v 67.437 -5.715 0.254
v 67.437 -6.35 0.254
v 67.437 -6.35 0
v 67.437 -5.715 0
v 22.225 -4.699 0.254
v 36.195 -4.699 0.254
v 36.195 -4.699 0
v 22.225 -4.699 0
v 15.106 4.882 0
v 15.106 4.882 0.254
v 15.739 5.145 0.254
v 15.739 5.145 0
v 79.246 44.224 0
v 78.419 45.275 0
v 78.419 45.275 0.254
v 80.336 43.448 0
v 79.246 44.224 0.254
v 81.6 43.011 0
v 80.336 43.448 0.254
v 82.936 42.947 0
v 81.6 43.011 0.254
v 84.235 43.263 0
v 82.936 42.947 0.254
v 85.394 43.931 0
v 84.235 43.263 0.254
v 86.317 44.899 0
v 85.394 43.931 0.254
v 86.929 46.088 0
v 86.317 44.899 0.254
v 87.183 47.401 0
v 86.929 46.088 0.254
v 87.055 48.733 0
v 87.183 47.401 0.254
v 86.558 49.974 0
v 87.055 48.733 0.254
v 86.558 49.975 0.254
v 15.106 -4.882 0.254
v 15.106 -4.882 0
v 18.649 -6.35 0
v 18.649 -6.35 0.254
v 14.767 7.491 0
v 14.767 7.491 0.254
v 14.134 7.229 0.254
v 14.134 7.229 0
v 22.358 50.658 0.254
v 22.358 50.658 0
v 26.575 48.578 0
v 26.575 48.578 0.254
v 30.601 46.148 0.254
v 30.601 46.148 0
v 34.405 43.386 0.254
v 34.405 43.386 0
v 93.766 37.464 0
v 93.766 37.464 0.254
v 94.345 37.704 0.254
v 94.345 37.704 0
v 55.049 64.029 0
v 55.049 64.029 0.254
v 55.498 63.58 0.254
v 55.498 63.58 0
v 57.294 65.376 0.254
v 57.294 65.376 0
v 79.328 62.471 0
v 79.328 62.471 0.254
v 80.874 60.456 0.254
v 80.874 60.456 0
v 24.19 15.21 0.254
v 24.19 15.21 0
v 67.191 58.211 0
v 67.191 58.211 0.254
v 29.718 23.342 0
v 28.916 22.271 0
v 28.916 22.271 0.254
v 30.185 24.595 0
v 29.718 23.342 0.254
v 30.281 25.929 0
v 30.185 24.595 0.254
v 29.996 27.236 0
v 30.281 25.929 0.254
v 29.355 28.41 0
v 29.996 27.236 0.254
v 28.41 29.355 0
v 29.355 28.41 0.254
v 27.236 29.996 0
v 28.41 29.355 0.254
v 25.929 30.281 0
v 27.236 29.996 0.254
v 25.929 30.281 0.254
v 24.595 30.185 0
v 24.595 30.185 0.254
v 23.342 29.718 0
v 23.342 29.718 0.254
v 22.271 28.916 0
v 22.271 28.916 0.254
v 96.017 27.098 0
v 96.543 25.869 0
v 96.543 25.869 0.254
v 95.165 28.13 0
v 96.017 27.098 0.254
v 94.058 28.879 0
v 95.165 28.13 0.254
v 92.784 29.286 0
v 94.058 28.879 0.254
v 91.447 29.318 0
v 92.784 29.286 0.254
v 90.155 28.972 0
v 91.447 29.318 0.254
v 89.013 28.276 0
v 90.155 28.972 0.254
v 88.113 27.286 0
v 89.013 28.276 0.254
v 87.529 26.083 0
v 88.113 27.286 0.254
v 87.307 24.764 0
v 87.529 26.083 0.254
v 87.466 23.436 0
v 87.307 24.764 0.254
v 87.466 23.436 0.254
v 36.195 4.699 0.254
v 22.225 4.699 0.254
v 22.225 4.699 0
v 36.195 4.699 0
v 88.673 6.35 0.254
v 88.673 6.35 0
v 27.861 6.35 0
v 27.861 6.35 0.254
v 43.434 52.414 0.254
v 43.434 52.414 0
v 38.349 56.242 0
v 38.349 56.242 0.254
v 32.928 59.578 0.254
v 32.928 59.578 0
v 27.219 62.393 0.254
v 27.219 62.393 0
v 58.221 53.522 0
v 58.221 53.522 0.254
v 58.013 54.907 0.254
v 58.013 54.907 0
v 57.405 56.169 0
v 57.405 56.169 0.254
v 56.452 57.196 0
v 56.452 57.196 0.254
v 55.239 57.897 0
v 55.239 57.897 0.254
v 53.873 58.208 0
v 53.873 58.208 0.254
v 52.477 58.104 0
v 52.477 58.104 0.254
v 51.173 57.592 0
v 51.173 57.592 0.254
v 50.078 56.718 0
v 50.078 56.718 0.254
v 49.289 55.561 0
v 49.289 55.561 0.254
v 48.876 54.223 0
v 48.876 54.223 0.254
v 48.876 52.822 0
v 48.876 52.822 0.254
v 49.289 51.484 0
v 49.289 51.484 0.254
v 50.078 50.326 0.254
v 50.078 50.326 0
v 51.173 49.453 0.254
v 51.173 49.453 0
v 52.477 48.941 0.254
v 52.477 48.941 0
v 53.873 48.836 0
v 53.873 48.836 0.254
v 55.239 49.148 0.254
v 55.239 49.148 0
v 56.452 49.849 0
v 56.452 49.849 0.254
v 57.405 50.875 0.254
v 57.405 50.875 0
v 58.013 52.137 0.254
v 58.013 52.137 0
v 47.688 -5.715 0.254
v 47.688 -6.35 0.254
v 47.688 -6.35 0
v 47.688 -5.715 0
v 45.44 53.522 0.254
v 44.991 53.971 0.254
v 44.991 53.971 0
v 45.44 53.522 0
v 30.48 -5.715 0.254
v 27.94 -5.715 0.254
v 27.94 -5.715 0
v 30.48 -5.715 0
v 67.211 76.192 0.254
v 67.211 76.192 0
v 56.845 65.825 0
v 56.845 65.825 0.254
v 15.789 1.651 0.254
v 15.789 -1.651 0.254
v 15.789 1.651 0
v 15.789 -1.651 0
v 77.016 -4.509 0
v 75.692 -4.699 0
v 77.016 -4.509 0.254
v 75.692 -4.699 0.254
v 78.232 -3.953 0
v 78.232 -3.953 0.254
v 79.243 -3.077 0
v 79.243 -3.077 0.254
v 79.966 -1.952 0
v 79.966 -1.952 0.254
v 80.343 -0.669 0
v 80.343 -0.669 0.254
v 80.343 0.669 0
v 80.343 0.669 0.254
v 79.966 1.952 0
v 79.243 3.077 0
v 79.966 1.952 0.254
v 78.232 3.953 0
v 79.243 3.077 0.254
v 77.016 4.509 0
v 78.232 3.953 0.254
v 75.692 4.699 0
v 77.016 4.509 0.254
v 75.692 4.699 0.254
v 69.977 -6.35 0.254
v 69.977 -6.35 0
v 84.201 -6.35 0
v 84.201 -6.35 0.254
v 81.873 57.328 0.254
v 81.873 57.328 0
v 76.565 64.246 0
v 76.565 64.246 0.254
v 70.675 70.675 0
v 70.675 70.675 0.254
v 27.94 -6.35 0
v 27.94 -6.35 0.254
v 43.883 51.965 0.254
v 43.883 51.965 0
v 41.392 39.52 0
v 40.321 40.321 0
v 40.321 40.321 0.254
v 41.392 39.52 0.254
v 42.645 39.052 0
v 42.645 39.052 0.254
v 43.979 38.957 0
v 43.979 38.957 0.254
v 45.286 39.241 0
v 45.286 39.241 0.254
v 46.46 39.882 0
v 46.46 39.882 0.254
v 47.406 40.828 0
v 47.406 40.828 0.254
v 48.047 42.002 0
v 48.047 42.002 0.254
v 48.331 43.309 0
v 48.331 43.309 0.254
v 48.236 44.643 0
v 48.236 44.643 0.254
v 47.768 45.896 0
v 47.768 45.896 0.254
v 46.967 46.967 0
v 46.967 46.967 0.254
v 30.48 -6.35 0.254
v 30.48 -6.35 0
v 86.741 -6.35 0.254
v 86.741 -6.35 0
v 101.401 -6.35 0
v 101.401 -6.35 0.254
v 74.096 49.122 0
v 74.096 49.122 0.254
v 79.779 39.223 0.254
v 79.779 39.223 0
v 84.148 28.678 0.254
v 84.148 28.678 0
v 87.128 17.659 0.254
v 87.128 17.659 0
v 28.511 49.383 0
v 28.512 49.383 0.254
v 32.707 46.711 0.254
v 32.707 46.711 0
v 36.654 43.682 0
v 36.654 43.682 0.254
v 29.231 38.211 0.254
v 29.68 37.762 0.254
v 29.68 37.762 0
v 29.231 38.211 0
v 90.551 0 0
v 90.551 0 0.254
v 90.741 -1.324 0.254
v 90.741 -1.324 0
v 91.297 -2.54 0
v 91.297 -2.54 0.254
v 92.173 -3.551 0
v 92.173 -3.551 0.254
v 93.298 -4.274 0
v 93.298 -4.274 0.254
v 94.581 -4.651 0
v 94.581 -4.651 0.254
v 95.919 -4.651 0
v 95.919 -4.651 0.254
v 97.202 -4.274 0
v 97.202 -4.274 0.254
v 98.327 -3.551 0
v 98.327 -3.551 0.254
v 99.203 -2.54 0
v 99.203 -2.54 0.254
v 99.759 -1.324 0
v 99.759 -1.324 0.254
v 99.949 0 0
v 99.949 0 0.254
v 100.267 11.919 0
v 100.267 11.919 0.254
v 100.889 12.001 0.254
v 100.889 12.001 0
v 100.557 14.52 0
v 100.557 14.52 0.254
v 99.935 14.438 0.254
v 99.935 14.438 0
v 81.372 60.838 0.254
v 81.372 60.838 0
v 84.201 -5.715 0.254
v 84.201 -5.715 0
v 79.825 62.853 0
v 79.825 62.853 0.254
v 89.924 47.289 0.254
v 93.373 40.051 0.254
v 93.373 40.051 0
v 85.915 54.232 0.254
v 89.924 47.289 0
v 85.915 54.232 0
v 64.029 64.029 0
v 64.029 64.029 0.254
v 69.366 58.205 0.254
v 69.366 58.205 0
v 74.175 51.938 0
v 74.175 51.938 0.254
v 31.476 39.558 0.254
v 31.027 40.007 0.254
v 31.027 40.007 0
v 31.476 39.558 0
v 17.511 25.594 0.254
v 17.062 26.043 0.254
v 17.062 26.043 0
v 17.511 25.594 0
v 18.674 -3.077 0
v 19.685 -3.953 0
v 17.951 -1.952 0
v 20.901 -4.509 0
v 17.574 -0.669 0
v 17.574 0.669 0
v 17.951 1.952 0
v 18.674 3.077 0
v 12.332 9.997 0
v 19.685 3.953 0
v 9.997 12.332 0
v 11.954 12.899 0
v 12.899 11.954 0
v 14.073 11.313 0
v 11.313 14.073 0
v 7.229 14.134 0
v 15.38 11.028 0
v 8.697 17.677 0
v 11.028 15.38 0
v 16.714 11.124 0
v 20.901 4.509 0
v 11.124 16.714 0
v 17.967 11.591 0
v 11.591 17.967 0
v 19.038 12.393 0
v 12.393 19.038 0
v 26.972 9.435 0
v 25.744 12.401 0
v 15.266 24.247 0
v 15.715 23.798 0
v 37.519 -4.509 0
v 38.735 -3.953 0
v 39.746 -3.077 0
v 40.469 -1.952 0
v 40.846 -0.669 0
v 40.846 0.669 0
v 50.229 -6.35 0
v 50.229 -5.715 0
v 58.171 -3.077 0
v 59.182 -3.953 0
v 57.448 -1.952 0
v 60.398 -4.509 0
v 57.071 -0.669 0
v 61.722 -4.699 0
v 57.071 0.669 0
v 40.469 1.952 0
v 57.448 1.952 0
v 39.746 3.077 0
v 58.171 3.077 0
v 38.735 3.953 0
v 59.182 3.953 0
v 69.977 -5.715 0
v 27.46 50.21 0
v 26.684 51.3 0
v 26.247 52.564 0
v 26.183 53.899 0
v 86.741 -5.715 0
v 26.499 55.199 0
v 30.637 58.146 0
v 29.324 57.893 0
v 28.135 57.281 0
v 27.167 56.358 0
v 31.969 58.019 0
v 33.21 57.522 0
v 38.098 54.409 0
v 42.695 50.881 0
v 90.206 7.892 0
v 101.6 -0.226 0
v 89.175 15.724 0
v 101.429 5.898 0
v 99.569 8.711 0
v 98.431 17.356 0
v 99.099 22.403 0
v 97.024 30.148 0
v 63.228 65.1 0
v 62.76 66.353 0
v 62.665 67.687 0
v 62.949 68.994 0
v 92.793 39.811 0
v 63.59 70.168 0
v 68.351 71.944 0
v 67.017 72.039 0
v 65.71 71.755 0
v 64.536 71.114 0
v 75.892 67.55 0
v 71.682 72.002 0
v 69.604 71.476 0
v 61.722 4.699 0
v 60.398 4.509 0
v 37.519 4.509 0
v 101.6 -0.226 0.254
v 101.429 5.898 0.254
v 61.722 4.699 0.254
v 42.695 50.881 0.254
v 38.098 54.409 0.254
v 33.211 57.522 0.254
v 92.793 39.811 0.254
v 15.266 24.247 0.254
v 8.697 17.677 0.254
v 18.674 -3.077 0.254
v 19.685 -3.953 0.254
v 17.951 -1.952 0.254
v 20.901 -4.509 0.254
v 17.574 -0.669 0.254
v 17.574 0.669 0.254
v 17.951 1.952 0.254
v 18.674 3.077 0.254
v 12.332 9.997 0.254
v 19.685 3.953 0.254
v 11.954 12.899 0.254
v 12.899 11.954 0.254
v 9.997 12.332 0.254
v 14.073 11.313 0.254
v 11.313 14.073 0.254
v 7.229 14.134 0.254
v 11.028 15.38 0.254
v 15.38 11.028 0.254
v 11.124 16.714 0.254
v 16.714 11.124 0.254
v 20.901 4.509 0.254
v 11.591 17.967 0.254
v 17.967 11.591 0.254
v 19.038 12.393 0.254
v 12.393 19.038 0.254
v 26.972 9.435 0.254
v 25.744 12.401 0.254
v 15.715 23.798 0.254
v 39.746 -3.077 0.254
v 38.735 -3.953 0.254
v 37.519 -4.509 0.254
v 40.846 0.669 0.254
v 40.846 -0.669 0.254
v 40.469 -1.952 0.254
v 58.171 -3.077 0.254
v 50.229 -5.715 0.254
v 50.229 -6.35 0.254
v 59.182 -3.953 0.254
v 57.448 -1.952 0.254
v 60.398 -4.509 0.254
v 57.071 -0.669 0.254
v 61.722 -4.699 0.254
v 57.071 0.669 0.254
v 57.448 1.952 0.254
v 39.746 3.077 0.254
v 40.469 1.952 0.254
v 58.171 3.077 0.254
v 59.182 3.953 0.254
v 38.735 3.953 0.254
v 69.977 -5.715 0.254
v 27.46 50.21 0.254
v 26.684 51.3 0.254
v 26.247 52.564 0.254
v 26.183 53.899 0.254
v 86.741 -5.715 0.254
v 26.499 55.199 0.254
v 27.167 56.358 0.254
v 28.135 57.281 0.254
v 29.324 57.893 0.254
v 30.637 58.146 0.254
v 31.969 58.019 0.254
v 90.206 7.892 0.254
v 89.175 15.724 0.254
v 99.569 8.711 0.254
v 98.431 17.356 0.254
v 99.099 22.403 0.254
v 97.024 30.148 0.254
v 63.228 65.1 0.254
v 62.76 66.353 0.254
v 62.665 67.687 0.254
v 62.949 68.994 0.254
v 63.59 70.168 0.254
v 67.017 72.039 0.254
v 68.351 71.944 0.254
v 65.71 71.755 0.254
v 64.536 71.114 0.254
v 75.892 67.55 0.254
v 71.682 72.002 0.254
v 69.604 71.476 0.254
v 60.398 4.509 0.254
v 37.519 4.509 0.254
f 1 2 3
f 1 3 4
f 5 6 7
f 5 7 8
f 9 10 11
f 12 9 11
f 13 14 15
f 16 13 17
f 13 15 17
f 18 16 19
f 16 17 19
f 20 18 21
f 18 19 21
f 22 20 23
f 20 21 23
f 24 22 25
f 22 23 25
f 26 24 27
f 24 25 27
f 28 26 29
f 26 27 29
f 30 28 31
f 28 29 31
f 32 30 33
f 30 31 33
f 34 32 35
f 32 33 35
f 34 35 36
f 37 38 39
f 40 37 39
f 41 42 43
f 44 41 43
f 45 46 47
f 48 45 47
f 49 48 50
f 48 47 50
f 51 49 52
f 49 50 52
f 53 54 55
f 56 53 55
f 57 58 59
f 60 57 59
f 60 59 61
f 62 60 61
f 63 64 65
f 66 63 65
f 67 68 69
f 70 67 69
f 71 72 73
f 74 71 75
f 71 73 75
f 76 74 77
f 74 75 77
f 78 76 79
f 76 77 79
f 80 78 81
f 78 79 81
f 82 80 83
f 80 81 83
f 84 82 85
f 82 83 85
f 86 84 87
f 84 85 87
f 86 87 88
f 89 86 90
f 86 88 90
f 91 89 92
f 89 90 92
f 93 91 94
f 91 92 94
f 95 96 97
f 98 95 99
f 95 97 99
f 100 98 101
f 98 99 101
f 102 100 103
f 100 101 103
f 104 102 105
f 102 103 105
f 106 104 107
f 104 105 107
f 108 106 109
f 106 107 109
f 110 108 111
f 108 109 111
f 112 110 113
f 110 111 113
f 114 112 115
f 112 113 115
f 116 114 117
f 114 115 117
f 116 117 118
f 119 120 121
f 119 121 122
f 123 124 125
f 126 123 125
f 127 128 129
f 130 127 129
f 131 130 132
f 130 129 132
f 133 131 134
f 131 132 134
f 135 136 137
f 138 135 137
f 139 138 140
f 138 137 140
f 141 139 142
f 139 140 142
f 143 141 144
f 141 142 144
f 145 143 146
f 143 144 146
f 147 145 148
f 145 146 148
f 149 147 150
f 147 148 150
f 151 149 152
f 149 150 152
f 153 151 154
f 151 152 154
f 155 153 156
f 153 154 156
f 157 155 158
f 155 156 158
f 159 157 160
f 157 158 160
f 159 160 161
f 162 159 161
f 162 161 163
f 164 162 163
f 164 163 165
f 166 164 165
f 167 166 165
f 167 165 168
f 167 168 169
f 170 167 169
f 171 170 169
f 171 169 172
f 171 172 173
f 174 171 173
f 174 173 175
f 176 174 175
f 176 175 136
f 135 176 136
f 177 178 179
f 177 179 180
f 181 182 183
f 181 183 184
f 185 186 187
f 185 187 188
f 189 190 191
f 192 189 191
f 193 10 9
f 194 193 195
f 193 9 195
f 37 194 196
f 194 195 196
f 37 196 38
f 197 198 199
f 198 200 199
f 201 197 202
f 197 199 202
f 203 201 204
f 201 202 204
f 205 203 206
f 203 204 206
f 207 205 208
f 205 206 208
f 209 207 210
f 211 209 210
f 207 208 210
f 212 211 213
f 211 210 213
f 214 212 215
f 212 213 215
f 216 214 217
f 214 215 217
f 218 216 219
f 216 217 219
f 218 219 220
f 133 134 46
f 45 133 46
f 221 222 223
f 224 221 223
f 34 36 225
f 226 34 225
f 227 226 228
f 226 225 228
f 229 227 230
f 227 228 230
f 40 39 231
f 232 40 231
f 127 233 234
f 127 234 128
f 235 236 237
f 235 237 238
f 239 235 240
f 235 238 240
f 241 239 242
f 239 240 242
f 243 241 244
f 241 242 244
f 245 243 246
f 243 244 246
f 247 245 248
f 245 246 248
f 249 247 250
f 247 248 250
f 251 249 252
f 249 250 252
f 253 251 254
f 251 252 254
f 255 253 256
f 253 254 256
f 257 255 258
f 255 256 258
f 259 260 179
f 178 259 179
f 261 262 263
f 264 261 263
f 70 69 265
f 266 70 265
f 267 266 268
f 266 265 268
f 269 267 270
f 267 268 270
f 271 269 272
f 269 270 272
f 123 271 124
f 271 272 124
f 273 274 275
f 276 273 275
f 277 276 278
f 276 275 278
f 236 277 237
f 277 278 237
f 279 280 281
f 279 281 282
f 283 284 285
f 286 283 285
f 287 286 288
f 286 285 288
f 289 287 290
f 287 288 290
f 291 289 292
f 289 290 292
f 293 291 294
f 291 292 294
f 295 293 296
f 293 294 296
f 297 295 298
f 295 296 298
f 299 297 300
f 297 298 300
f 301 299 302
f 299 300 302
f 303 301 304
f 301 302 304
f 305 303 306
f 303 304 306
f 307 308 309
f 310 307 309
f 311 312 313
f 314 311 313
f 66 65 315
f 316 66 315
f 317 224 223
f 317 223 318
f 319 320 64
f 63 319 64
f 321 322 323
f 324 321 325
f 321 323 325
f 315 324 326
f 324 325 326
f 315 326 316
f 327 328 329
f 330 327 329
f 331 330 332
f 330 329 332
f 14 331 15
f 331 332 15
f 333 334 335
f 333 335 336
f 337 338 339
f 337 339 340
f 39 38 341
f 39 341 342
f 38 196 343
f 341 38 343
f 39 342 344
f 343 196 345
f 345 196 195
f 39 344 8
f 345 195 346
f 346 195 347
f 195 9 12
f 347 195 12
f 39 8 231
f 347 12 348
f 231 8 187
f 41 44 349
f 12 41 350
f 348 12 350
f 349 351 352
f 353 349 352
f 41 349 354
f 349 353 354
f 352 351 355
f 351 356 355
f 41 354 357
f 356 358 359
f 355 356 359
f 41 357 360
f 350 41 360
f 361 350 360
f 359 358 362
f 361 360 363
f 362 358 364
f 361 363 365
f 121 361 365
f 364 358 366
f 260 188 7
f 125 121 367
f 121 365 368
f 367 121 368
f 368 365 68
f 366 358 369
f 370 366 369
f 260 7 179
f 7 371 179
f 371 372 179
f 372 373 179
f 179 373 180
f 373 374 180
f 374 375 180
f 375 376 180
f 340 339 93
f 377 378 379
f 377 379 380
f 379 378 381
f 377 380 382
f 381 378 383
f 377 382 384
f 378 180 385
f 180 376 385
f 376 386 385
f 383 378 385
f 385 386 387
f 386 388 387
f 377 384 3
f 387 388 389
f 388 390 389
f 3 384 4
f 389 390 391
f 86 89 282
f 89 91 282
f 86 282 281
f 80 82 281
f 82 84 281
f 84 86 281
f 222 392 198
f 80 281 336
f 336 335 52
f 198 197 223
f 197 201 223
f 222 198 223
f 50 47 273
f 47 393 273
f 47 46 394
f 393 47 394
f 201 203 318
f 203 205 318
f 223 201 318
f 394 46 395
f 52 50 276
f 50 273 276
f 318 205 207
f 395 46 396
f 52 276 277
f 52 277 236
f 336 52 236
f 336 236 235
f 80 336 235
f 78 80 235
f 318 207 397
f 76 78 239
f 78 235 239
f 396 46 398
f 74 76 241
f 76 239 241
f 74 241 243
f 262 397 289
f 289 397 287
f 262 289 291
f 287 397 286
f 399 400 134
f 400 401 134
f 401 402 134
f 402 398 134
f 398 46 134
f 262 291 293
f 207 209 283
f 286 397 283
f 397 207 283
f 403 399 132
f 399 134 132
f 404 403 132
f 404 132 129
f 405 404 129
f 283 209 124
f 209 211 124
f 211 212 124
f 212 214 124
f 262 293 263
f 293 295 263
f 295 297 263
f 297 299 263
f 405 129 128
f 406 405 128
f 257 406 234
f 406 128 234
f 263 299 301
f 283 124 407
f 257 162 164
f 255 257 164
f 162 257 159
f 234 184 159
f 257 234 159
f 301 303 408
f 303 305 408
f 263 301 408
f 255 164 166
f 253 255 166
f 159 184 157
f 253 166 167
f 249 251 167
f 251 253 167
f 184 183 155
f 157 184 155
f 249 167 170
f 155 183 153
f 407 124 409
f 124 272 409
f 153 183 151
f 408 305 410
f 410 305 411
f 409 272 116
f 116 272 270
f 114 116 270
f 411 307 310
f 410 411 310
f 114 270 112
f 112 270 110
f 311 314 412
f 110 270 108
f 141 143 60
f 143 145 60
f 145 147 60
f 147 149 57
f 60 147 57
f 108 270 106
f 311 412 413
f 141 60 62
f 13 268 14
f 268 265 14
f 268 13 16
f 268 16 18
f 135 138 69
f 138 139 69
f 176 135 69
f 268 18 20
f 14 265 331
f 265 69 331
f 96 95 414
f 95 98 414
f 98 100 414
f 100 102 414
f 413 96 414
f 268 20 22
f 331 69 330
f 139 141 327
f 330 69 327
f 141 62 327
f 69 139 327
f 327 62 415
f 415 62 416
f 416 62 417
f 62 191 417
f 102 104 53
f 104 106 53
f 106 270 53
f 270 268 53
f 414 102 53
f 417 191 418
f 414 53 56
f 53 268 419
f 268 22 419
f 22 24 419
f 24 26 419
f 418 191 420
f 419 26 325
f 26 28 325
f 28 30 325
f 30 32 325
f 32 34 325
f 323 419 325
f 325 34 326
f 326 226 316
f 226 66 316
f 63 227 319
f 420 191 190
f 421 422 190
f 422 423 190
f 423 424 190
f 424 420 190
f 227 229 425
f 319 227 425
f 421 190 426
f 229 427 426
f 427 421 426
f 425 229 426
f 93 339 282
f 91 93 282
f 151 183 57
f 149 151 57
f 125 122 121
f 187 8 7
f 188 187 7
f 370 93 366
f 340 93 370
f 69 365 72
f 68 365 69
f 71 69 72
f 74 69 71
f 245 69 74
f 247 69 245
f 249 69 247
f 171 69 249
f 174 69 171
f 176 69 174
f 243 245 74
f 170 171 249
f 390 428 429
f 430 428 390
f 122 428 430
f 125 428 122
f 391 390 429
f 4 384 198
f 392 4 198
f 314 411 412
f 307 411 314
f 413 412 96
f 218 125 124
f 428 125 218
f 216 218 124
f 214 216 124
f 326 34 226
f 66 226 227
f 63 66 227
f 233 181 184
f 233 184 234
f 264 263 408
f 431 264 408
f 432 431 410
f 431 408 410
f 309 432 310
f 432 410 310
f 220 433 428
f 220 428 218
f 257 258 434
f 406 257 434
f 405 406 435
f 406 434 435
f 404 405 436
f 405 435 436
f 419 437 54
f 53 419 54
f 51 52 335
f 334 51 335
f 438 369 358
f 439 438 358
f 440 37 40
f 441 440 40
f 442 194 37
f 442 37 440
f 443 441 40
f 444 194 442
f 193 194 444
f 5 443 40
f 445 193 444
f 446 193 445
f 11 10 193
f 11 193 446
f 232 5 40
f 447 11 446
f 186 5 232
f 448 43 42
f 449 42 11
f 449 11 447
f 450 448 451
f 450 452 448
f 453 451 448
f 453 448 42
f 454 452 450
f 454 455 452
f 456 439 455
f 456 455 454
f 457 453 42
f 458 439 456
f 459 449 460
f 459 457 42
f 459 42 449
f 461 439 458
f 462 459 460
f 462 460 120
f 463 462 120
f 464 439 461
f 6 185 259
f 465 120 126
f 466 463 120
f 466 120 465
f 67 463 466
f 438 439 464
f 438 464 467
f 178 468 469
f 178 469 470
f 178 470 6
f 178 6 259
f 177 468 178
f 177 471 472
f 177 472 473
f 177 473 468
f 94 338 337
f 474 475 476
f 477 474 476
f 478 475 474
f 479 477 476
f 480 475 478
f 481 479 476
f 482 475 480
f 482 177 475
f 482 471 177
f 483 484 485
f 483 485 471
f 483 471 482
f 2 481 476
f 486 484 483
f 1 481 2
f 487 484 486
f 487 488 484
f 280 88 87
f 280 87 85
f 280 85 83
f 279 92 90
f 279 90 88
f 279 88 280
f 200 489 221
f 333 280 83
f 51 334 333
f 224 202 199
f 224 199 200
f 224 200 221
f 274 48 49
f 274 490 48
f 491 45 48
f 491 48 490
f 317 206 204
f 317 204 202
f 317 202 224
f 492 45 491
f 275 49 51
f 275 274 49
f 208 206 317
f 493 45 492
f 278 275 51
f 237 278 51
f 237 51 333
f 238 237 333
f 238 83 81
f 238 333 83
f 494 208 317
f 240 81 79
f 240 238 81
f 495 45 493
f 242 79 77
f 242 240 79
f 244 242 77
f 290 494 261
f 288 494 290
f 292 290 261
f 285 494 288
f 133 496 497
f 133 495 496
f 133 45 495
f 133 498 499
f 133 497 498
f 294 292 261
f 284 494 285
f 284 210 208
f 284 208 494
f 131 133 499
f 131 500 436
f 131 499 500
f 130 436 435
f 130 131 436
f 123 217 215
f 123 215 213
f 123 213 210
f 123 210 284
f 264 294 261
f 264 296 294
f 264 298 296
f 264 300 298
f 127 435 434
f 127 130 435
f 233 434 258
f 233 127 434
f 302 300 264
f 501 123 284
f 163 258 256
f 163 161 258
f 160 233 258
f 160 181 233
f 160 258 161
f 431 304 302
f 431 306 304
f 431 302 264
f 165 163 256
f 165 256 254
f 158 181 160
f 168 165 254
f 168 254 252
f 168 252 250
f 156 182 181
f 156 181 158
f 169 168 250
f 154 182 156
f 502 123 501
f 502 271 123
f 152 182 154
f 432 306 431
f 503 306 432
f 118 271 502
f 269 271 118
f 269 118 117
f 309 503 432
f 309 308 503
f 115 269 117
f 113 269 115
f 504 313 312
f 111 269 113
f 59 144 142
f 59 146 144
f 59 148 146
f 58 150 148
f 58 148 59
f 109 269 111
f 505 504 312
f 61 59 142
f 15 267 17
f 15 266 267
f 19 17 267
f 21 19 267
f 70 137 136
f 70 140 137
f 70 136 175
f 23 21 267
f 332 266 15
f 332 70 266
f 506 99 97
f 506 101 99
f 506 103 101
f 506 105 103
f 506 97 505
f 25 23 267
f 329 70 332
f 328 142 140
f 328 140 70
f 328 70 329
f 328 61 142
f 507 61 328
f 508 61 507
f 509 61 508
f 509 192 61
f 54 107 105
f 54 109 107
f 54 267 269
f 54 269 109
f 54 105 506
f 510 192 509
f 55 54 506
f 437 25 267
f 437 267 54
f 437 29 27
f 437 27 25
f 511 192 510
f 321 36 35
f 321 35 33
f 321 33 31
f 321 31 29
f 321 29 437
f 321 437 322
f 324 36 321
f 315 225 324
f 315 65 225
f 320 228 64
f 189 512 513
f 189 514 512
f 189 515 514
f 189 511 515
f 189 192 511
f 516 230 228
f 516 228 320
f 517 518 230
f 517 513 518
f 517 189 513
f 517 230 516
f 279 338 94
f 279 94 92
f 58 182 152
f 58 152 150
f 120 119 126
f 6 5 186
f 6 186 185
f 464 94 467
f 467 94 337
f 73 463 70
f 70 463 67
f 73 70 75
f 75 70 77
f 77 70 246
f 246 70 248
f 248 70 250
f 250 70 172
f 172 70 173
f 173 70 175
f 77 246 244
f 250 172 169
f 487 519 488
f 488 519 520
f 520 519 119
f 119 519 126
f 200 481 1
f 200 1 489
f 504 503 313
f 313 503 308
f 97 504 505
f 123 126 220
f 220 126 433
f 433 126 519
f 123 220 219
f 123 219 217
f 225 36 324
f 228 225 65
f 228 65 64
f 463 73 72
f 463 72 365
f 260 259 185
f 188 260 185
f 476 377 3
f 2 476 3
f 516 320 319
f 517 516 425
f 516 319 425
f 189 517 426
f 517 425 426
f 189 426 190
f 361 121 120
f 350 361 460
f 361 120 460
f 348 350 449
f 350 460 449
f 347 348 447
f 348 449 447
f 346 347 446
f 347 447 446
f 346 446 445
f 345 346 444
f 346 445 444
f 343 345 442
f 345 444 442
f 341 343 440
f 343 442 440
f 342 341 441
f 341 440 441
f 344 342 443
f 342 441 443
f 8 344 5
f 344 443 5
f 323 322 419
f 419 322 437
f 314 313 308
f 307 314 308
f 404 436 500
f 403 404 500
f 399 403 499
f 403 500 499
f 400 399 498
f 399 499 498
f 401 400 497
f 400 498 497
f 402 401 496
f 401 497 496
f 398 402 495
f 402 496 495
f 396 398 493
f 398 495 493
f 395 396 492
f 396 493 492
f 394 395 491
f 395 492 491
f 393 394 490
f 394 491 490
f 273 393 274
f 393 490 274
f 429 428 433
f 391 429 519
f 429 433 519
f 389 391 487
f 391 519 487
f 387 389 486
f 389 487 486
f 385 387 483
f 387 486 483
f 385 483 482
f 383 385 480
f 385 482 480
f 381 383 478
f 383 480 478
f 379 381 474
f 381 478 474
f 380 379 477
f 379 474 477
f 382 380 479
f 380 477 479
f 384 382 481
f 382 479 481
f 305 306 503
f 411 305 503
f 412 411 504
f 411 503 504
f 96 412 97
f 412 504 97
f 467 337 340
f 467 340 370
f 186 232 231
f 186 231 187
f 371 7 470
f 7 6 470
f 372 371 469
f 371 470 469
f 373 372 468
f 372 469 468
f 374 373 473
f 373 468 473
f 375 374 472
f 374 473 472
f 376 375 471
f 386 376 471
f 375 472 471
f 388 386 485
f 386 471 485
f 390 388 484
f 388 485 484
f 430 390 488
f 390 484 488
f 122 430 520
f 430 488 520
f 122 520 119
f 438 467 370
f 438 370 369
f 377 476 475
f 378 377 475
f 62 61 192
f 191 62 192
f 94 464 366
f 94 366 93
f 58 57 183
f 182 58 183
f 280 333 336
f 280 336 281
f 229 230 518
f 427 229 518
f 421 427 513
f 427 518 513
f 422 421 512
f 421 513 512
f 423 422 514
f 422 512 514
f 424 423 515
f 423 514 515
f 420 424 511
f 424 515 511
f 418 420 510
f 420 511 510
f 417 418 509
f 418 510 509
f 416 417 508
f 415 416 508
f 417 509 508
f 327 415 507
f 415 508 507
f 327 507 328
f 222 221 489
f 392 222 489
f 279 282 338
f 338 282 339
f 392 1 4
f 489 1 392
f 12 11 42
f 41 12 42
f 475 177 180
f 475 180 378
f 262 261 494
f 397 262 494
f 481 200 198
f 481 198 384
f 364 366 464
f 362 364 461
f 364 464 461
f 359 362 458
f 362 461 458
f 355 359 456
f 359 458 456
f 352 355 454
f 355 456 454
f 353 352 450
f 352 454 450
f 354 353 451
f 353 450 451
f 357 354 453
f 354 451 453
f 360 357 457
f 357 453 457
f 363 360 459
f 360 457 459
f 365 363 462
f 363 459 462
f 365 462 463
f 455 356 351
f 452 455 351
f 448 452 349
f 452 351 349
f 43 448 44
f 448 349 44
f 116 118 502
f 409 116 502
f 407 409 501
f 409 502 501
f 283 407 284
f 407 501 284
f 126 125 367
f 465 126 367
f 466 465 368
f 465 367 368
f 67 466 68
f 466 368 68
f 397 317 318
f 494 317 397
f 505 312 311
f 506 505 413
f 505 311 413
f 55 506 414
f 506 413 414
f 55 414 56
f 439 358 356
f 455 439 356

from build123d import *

# Parameters (mm, degrees)
BOSS_EXTRUDE1_DEPTH = 0.254
SKETCH2_R           = 4.699
CUT_EXTRUDE1_DEPTH  = 1.254
SKETCH3_W           = 2.54
SKETCH3_H           = 0.635
CUT_EXTRUDE2_DEPTH  = 1.254
CUT_EXTRUDE3_DEPTH  = 1.254


with BuildPart() as part:
    # Sketch1 → Boss-Extrude1 (new body)
    with BuildSketch(Plane.XY):
        with BuildLine():
            Line((27.218819563, 62.393373411), (22.357699804, 50.65759216))
            ThreePointArc((22.357699804, 50.65759216), (28.61353693, 47.405947816), (34.405475059, 43.38573118))
            Line((34.405475059, 43.38573118), (8.696654013, 17.676910134))
            Line((8.696654013, 17.676910134), (7.228954972, 14.133571205))
            ThreePointArc((7.228954972, 14.133571205), (14.666587579, 6.075099489), (15.105587123, -4.88230096))
            Line((15.105587123, -4.88230096), (18.648926052, -6.35))
            Line((18.648926052, -6.35), (101.401368334, -6.35))
            ThreePointArc((101.401368334, -6.35), (93.866160503, 38.880636728), (67.21146711, 76.191723231))
            Line((67.21146711, 76.191723231), (43.43415954, 52.414415661))
            ThreePointArc((43.43415954, 52.414415661), (35.677104191, 57.973626939), (27.218819563, 62.393373411))
        make_face()
        with BuildLine():
            Line((88.672924278, 6.35), (27.86051193, 6.35))
            ThreePointArc((27.86051193, 6.35), (26.399857642, 10.93517908), (24.190484974, 15.210228852))
            Line((24.190484974, 15.210228852), (67.191354125, 58.211098004))
            ThreePointArc((67.191354125, 58.211098004), (82.13289044, 34.020557137), (88.672924278, 6.35))
        make_face(mode=Mode.SUBTRACT)
    extrude(amount=BOSS_EXTRUDE1_DEPTH)

    # Sketch2 → Cut-Extrude1 (cut, through all)
    with BuildSketch(Plane.XY.offset(0.254)):
        with Locations((22.225, 0)):
            Circle(SKETCH2_R)
        with Locations((36.195, 0)):
            Circle(SKETCH2_R)
        with Locations((61.722, 0)):
            Circle(SKETCH2_R)
        with Locations((75.692, 0)):
            Circle(SKETCH2_R)
        with Locations((95.25, 0)):
            Circle(SKETCH2_R)
        with Locations((15.715448212, 15.715448212)):
            Circle(SKETCH2_R)
        with Locations((25.593729945, 25.593729945)):
            Circle(SKETCH2_R)
        with Locations((43.644044748, 43.644044748)):
            Circle(SKETCH2_R)
        with Locations((53.522326482, 53.522326482)):
            Circle(SKETCH2_R)
        with Locations((92.004434954, 24.652514046)):
            Circle(SKETCH2_R)
        with Locations((82.48891971, 47.625)):
            Circle(SKETCH2_R)
        with Locations((67.351920908, 67.351920908)):
            Circle(SKETCH2_R)
        with Locations((30.861, 53.452819972)):
            Circle(SKETCH2_R)
    extrude(amount=-CUT_EXTRUDE1_DEPTH, mode=Mode.SUBTRACT)

    # Sketch3 → Cut-Extrude2 (cut, through all)
    with BuildSketch(Plane.XY.offset(0.254)):
        Polygon((15.266435406, 24.246691527), (17.06248663, 26.042742751), (17.511499436, 25.593729945), (15.715448212, 23.797678721), align=None)
        Polygon((43.43415954, 52.414415661), (44.991083167, 53.971339288), (45.440095973, 53.522326482), (43.883172346, 51.965402855), align=None)
        with Locations((29.21, -6.0325)):
            Rectangle(SKETCH3_W, SKETCH3_H)
        with Locations((68.707, -6.0325)):
            Rectangle(SKETCH3_W, SKETCH3_H)
        Polygon((29.230733674, 38.210989795), (31.026784898, 40.007041019), (31.475797704, 39.558028213), (29.67974648, 37.761976989), align=None)
        Polygon((56.845021246, 65.825277367), (55.048970022, 64.029226143), (55.497982828, 63.580213337), (57.294034052, 65.376264561), align=None)
        with Locations((48.9585, -6.0325)):
            Rectangle(SKETCH3_W, SKETCH3_H)
        with Locations((85.471, -6.0325)):
            Rectangle(SKETCH3_W, SKETCH3_H)
        Polygon((99.935462164, 14.437711971), (100.266998693, 11.919442024), (101.526133667, 12.085210288), (101.194597138, 14.603480236), align=None)
        Polygon((93.765504959, 37.464305742), (94.938831965, 37.950313702), (93.966816047, 40.296967714), (92.793489041, 39.810959755), align=None)
        Polygon((79.327792988, 62.471156422), (80.874047017, 60.456038938), (81.88160576, 61.229165953), (80.33535173, 63.244283437), align=None)
        Polygon((13.593916116, 7.005422516), (14.565932035, 4.658768503), (15.739259041, 5.144776462), (14.767243123, 7.491430475), align=None)
    extrude(amount=-CUT_EXTRUDE2_DEPTH, mode=Mode.SUBTRACT)

    # Sketch7 → Cut-Extrude3 (cut, through all)
    with BuildSketch(Plane.XY.offset(0.254)):
        with BuildLine():
            Line((12.392753447, 19.038142977), (22.27103518, 28.91642471))
            ThreePointArc((22.27103518, 28.91642471), (28.91642471, 28.91642471), (28.91642471, 22.27103518))
            Line((28.91642471, 22.27103518), (19.038142977, 12.392753447))
            ThreePointArc((19.038142977, 12.392753447), (12.392753447, 12.392753447), (12.392753447, 19.038142977))
        make_face()
        with BuildLine():
            Line((22.225, 4.699), (36.195, 4.699))
            ThreePointArc((36.195, 4.699), (40.894, 0), (36.195, -4.699))
            Line((36.195, -4.699), (22.225, -4.699))
            ThreePointArc((22.225, -4.699), (17.526, 0), (22.225, 4.699))
        make_face()
        with BuildLine():
            Line((61.722, 4.699), (75.692, 4.699))
            ThreePointArc((75.692, 4.699), (80.391, 0), (75.692, -4.699))
            Line((75.692, -4.699), (61.722, -4.699))
            ThreePointArc((61.722, -4.699), (57.023, 0), (61.722, 4.699))
        make_face()
        with BuildLine():
            ThreePointArc((46.966739513, 46.966739513), (40.434542876, 52.695322215), (33.2105, 57.522273345))
            ThreePointArc((33.2105, 57.522273345), (26.791546628, 55.802319972), (28.5115, 49.3833666))
            ThreePointArc((28.5115, 49.3833666), (34.713402966, 45.239387523), (40.321349984, 40.321349984))
            ThreePointArc((40.321349984, 40.321349984), (46.966739513, 40.321349984), (46.966739513, 46.966739513))
        make_face()
        with BuildLine():
            ThreePointArc((99.949, 0), (99.093922449, 13.045962386), (96.543320412, 25.868704739))
            ThreePointArc((96.543320412, 25.868704739), (90.788244261, 29.191399504), (87.465549496, 23.436323353))
            ThreePointArc((87.465549496, 23.436323353), (89.776323642, 11.819277232), (90.551, 0))
            ThreePointArc((90.551, 0), (95.25, -4.699), (99.949, 0))
        make_face()
        with BuildLine():
            ThreePointArc((86.558373083, 49.9745), (79.294873009, 60.845096068), (70.674615673, 70.674615673))
            ThreePointArc((70.674615673, 70.674615673), (64.029226143, 70.674615673), (64.029226143, 64.029226143))
            ThreePointArc((64.029226143, 64.029226143), (71.838938317, 55.123956158), (78.419466338, 45.2755))
            ThreePointArc((78.419466338, 45.2755), (84.83841971, 43.555546628), (86.558373083, 49.9745))
        make_face()
    extrude(amount=-CUT_EXTRUDE3_DEPTH, mode=Mode.SUBTRACT)


solid = part.part
